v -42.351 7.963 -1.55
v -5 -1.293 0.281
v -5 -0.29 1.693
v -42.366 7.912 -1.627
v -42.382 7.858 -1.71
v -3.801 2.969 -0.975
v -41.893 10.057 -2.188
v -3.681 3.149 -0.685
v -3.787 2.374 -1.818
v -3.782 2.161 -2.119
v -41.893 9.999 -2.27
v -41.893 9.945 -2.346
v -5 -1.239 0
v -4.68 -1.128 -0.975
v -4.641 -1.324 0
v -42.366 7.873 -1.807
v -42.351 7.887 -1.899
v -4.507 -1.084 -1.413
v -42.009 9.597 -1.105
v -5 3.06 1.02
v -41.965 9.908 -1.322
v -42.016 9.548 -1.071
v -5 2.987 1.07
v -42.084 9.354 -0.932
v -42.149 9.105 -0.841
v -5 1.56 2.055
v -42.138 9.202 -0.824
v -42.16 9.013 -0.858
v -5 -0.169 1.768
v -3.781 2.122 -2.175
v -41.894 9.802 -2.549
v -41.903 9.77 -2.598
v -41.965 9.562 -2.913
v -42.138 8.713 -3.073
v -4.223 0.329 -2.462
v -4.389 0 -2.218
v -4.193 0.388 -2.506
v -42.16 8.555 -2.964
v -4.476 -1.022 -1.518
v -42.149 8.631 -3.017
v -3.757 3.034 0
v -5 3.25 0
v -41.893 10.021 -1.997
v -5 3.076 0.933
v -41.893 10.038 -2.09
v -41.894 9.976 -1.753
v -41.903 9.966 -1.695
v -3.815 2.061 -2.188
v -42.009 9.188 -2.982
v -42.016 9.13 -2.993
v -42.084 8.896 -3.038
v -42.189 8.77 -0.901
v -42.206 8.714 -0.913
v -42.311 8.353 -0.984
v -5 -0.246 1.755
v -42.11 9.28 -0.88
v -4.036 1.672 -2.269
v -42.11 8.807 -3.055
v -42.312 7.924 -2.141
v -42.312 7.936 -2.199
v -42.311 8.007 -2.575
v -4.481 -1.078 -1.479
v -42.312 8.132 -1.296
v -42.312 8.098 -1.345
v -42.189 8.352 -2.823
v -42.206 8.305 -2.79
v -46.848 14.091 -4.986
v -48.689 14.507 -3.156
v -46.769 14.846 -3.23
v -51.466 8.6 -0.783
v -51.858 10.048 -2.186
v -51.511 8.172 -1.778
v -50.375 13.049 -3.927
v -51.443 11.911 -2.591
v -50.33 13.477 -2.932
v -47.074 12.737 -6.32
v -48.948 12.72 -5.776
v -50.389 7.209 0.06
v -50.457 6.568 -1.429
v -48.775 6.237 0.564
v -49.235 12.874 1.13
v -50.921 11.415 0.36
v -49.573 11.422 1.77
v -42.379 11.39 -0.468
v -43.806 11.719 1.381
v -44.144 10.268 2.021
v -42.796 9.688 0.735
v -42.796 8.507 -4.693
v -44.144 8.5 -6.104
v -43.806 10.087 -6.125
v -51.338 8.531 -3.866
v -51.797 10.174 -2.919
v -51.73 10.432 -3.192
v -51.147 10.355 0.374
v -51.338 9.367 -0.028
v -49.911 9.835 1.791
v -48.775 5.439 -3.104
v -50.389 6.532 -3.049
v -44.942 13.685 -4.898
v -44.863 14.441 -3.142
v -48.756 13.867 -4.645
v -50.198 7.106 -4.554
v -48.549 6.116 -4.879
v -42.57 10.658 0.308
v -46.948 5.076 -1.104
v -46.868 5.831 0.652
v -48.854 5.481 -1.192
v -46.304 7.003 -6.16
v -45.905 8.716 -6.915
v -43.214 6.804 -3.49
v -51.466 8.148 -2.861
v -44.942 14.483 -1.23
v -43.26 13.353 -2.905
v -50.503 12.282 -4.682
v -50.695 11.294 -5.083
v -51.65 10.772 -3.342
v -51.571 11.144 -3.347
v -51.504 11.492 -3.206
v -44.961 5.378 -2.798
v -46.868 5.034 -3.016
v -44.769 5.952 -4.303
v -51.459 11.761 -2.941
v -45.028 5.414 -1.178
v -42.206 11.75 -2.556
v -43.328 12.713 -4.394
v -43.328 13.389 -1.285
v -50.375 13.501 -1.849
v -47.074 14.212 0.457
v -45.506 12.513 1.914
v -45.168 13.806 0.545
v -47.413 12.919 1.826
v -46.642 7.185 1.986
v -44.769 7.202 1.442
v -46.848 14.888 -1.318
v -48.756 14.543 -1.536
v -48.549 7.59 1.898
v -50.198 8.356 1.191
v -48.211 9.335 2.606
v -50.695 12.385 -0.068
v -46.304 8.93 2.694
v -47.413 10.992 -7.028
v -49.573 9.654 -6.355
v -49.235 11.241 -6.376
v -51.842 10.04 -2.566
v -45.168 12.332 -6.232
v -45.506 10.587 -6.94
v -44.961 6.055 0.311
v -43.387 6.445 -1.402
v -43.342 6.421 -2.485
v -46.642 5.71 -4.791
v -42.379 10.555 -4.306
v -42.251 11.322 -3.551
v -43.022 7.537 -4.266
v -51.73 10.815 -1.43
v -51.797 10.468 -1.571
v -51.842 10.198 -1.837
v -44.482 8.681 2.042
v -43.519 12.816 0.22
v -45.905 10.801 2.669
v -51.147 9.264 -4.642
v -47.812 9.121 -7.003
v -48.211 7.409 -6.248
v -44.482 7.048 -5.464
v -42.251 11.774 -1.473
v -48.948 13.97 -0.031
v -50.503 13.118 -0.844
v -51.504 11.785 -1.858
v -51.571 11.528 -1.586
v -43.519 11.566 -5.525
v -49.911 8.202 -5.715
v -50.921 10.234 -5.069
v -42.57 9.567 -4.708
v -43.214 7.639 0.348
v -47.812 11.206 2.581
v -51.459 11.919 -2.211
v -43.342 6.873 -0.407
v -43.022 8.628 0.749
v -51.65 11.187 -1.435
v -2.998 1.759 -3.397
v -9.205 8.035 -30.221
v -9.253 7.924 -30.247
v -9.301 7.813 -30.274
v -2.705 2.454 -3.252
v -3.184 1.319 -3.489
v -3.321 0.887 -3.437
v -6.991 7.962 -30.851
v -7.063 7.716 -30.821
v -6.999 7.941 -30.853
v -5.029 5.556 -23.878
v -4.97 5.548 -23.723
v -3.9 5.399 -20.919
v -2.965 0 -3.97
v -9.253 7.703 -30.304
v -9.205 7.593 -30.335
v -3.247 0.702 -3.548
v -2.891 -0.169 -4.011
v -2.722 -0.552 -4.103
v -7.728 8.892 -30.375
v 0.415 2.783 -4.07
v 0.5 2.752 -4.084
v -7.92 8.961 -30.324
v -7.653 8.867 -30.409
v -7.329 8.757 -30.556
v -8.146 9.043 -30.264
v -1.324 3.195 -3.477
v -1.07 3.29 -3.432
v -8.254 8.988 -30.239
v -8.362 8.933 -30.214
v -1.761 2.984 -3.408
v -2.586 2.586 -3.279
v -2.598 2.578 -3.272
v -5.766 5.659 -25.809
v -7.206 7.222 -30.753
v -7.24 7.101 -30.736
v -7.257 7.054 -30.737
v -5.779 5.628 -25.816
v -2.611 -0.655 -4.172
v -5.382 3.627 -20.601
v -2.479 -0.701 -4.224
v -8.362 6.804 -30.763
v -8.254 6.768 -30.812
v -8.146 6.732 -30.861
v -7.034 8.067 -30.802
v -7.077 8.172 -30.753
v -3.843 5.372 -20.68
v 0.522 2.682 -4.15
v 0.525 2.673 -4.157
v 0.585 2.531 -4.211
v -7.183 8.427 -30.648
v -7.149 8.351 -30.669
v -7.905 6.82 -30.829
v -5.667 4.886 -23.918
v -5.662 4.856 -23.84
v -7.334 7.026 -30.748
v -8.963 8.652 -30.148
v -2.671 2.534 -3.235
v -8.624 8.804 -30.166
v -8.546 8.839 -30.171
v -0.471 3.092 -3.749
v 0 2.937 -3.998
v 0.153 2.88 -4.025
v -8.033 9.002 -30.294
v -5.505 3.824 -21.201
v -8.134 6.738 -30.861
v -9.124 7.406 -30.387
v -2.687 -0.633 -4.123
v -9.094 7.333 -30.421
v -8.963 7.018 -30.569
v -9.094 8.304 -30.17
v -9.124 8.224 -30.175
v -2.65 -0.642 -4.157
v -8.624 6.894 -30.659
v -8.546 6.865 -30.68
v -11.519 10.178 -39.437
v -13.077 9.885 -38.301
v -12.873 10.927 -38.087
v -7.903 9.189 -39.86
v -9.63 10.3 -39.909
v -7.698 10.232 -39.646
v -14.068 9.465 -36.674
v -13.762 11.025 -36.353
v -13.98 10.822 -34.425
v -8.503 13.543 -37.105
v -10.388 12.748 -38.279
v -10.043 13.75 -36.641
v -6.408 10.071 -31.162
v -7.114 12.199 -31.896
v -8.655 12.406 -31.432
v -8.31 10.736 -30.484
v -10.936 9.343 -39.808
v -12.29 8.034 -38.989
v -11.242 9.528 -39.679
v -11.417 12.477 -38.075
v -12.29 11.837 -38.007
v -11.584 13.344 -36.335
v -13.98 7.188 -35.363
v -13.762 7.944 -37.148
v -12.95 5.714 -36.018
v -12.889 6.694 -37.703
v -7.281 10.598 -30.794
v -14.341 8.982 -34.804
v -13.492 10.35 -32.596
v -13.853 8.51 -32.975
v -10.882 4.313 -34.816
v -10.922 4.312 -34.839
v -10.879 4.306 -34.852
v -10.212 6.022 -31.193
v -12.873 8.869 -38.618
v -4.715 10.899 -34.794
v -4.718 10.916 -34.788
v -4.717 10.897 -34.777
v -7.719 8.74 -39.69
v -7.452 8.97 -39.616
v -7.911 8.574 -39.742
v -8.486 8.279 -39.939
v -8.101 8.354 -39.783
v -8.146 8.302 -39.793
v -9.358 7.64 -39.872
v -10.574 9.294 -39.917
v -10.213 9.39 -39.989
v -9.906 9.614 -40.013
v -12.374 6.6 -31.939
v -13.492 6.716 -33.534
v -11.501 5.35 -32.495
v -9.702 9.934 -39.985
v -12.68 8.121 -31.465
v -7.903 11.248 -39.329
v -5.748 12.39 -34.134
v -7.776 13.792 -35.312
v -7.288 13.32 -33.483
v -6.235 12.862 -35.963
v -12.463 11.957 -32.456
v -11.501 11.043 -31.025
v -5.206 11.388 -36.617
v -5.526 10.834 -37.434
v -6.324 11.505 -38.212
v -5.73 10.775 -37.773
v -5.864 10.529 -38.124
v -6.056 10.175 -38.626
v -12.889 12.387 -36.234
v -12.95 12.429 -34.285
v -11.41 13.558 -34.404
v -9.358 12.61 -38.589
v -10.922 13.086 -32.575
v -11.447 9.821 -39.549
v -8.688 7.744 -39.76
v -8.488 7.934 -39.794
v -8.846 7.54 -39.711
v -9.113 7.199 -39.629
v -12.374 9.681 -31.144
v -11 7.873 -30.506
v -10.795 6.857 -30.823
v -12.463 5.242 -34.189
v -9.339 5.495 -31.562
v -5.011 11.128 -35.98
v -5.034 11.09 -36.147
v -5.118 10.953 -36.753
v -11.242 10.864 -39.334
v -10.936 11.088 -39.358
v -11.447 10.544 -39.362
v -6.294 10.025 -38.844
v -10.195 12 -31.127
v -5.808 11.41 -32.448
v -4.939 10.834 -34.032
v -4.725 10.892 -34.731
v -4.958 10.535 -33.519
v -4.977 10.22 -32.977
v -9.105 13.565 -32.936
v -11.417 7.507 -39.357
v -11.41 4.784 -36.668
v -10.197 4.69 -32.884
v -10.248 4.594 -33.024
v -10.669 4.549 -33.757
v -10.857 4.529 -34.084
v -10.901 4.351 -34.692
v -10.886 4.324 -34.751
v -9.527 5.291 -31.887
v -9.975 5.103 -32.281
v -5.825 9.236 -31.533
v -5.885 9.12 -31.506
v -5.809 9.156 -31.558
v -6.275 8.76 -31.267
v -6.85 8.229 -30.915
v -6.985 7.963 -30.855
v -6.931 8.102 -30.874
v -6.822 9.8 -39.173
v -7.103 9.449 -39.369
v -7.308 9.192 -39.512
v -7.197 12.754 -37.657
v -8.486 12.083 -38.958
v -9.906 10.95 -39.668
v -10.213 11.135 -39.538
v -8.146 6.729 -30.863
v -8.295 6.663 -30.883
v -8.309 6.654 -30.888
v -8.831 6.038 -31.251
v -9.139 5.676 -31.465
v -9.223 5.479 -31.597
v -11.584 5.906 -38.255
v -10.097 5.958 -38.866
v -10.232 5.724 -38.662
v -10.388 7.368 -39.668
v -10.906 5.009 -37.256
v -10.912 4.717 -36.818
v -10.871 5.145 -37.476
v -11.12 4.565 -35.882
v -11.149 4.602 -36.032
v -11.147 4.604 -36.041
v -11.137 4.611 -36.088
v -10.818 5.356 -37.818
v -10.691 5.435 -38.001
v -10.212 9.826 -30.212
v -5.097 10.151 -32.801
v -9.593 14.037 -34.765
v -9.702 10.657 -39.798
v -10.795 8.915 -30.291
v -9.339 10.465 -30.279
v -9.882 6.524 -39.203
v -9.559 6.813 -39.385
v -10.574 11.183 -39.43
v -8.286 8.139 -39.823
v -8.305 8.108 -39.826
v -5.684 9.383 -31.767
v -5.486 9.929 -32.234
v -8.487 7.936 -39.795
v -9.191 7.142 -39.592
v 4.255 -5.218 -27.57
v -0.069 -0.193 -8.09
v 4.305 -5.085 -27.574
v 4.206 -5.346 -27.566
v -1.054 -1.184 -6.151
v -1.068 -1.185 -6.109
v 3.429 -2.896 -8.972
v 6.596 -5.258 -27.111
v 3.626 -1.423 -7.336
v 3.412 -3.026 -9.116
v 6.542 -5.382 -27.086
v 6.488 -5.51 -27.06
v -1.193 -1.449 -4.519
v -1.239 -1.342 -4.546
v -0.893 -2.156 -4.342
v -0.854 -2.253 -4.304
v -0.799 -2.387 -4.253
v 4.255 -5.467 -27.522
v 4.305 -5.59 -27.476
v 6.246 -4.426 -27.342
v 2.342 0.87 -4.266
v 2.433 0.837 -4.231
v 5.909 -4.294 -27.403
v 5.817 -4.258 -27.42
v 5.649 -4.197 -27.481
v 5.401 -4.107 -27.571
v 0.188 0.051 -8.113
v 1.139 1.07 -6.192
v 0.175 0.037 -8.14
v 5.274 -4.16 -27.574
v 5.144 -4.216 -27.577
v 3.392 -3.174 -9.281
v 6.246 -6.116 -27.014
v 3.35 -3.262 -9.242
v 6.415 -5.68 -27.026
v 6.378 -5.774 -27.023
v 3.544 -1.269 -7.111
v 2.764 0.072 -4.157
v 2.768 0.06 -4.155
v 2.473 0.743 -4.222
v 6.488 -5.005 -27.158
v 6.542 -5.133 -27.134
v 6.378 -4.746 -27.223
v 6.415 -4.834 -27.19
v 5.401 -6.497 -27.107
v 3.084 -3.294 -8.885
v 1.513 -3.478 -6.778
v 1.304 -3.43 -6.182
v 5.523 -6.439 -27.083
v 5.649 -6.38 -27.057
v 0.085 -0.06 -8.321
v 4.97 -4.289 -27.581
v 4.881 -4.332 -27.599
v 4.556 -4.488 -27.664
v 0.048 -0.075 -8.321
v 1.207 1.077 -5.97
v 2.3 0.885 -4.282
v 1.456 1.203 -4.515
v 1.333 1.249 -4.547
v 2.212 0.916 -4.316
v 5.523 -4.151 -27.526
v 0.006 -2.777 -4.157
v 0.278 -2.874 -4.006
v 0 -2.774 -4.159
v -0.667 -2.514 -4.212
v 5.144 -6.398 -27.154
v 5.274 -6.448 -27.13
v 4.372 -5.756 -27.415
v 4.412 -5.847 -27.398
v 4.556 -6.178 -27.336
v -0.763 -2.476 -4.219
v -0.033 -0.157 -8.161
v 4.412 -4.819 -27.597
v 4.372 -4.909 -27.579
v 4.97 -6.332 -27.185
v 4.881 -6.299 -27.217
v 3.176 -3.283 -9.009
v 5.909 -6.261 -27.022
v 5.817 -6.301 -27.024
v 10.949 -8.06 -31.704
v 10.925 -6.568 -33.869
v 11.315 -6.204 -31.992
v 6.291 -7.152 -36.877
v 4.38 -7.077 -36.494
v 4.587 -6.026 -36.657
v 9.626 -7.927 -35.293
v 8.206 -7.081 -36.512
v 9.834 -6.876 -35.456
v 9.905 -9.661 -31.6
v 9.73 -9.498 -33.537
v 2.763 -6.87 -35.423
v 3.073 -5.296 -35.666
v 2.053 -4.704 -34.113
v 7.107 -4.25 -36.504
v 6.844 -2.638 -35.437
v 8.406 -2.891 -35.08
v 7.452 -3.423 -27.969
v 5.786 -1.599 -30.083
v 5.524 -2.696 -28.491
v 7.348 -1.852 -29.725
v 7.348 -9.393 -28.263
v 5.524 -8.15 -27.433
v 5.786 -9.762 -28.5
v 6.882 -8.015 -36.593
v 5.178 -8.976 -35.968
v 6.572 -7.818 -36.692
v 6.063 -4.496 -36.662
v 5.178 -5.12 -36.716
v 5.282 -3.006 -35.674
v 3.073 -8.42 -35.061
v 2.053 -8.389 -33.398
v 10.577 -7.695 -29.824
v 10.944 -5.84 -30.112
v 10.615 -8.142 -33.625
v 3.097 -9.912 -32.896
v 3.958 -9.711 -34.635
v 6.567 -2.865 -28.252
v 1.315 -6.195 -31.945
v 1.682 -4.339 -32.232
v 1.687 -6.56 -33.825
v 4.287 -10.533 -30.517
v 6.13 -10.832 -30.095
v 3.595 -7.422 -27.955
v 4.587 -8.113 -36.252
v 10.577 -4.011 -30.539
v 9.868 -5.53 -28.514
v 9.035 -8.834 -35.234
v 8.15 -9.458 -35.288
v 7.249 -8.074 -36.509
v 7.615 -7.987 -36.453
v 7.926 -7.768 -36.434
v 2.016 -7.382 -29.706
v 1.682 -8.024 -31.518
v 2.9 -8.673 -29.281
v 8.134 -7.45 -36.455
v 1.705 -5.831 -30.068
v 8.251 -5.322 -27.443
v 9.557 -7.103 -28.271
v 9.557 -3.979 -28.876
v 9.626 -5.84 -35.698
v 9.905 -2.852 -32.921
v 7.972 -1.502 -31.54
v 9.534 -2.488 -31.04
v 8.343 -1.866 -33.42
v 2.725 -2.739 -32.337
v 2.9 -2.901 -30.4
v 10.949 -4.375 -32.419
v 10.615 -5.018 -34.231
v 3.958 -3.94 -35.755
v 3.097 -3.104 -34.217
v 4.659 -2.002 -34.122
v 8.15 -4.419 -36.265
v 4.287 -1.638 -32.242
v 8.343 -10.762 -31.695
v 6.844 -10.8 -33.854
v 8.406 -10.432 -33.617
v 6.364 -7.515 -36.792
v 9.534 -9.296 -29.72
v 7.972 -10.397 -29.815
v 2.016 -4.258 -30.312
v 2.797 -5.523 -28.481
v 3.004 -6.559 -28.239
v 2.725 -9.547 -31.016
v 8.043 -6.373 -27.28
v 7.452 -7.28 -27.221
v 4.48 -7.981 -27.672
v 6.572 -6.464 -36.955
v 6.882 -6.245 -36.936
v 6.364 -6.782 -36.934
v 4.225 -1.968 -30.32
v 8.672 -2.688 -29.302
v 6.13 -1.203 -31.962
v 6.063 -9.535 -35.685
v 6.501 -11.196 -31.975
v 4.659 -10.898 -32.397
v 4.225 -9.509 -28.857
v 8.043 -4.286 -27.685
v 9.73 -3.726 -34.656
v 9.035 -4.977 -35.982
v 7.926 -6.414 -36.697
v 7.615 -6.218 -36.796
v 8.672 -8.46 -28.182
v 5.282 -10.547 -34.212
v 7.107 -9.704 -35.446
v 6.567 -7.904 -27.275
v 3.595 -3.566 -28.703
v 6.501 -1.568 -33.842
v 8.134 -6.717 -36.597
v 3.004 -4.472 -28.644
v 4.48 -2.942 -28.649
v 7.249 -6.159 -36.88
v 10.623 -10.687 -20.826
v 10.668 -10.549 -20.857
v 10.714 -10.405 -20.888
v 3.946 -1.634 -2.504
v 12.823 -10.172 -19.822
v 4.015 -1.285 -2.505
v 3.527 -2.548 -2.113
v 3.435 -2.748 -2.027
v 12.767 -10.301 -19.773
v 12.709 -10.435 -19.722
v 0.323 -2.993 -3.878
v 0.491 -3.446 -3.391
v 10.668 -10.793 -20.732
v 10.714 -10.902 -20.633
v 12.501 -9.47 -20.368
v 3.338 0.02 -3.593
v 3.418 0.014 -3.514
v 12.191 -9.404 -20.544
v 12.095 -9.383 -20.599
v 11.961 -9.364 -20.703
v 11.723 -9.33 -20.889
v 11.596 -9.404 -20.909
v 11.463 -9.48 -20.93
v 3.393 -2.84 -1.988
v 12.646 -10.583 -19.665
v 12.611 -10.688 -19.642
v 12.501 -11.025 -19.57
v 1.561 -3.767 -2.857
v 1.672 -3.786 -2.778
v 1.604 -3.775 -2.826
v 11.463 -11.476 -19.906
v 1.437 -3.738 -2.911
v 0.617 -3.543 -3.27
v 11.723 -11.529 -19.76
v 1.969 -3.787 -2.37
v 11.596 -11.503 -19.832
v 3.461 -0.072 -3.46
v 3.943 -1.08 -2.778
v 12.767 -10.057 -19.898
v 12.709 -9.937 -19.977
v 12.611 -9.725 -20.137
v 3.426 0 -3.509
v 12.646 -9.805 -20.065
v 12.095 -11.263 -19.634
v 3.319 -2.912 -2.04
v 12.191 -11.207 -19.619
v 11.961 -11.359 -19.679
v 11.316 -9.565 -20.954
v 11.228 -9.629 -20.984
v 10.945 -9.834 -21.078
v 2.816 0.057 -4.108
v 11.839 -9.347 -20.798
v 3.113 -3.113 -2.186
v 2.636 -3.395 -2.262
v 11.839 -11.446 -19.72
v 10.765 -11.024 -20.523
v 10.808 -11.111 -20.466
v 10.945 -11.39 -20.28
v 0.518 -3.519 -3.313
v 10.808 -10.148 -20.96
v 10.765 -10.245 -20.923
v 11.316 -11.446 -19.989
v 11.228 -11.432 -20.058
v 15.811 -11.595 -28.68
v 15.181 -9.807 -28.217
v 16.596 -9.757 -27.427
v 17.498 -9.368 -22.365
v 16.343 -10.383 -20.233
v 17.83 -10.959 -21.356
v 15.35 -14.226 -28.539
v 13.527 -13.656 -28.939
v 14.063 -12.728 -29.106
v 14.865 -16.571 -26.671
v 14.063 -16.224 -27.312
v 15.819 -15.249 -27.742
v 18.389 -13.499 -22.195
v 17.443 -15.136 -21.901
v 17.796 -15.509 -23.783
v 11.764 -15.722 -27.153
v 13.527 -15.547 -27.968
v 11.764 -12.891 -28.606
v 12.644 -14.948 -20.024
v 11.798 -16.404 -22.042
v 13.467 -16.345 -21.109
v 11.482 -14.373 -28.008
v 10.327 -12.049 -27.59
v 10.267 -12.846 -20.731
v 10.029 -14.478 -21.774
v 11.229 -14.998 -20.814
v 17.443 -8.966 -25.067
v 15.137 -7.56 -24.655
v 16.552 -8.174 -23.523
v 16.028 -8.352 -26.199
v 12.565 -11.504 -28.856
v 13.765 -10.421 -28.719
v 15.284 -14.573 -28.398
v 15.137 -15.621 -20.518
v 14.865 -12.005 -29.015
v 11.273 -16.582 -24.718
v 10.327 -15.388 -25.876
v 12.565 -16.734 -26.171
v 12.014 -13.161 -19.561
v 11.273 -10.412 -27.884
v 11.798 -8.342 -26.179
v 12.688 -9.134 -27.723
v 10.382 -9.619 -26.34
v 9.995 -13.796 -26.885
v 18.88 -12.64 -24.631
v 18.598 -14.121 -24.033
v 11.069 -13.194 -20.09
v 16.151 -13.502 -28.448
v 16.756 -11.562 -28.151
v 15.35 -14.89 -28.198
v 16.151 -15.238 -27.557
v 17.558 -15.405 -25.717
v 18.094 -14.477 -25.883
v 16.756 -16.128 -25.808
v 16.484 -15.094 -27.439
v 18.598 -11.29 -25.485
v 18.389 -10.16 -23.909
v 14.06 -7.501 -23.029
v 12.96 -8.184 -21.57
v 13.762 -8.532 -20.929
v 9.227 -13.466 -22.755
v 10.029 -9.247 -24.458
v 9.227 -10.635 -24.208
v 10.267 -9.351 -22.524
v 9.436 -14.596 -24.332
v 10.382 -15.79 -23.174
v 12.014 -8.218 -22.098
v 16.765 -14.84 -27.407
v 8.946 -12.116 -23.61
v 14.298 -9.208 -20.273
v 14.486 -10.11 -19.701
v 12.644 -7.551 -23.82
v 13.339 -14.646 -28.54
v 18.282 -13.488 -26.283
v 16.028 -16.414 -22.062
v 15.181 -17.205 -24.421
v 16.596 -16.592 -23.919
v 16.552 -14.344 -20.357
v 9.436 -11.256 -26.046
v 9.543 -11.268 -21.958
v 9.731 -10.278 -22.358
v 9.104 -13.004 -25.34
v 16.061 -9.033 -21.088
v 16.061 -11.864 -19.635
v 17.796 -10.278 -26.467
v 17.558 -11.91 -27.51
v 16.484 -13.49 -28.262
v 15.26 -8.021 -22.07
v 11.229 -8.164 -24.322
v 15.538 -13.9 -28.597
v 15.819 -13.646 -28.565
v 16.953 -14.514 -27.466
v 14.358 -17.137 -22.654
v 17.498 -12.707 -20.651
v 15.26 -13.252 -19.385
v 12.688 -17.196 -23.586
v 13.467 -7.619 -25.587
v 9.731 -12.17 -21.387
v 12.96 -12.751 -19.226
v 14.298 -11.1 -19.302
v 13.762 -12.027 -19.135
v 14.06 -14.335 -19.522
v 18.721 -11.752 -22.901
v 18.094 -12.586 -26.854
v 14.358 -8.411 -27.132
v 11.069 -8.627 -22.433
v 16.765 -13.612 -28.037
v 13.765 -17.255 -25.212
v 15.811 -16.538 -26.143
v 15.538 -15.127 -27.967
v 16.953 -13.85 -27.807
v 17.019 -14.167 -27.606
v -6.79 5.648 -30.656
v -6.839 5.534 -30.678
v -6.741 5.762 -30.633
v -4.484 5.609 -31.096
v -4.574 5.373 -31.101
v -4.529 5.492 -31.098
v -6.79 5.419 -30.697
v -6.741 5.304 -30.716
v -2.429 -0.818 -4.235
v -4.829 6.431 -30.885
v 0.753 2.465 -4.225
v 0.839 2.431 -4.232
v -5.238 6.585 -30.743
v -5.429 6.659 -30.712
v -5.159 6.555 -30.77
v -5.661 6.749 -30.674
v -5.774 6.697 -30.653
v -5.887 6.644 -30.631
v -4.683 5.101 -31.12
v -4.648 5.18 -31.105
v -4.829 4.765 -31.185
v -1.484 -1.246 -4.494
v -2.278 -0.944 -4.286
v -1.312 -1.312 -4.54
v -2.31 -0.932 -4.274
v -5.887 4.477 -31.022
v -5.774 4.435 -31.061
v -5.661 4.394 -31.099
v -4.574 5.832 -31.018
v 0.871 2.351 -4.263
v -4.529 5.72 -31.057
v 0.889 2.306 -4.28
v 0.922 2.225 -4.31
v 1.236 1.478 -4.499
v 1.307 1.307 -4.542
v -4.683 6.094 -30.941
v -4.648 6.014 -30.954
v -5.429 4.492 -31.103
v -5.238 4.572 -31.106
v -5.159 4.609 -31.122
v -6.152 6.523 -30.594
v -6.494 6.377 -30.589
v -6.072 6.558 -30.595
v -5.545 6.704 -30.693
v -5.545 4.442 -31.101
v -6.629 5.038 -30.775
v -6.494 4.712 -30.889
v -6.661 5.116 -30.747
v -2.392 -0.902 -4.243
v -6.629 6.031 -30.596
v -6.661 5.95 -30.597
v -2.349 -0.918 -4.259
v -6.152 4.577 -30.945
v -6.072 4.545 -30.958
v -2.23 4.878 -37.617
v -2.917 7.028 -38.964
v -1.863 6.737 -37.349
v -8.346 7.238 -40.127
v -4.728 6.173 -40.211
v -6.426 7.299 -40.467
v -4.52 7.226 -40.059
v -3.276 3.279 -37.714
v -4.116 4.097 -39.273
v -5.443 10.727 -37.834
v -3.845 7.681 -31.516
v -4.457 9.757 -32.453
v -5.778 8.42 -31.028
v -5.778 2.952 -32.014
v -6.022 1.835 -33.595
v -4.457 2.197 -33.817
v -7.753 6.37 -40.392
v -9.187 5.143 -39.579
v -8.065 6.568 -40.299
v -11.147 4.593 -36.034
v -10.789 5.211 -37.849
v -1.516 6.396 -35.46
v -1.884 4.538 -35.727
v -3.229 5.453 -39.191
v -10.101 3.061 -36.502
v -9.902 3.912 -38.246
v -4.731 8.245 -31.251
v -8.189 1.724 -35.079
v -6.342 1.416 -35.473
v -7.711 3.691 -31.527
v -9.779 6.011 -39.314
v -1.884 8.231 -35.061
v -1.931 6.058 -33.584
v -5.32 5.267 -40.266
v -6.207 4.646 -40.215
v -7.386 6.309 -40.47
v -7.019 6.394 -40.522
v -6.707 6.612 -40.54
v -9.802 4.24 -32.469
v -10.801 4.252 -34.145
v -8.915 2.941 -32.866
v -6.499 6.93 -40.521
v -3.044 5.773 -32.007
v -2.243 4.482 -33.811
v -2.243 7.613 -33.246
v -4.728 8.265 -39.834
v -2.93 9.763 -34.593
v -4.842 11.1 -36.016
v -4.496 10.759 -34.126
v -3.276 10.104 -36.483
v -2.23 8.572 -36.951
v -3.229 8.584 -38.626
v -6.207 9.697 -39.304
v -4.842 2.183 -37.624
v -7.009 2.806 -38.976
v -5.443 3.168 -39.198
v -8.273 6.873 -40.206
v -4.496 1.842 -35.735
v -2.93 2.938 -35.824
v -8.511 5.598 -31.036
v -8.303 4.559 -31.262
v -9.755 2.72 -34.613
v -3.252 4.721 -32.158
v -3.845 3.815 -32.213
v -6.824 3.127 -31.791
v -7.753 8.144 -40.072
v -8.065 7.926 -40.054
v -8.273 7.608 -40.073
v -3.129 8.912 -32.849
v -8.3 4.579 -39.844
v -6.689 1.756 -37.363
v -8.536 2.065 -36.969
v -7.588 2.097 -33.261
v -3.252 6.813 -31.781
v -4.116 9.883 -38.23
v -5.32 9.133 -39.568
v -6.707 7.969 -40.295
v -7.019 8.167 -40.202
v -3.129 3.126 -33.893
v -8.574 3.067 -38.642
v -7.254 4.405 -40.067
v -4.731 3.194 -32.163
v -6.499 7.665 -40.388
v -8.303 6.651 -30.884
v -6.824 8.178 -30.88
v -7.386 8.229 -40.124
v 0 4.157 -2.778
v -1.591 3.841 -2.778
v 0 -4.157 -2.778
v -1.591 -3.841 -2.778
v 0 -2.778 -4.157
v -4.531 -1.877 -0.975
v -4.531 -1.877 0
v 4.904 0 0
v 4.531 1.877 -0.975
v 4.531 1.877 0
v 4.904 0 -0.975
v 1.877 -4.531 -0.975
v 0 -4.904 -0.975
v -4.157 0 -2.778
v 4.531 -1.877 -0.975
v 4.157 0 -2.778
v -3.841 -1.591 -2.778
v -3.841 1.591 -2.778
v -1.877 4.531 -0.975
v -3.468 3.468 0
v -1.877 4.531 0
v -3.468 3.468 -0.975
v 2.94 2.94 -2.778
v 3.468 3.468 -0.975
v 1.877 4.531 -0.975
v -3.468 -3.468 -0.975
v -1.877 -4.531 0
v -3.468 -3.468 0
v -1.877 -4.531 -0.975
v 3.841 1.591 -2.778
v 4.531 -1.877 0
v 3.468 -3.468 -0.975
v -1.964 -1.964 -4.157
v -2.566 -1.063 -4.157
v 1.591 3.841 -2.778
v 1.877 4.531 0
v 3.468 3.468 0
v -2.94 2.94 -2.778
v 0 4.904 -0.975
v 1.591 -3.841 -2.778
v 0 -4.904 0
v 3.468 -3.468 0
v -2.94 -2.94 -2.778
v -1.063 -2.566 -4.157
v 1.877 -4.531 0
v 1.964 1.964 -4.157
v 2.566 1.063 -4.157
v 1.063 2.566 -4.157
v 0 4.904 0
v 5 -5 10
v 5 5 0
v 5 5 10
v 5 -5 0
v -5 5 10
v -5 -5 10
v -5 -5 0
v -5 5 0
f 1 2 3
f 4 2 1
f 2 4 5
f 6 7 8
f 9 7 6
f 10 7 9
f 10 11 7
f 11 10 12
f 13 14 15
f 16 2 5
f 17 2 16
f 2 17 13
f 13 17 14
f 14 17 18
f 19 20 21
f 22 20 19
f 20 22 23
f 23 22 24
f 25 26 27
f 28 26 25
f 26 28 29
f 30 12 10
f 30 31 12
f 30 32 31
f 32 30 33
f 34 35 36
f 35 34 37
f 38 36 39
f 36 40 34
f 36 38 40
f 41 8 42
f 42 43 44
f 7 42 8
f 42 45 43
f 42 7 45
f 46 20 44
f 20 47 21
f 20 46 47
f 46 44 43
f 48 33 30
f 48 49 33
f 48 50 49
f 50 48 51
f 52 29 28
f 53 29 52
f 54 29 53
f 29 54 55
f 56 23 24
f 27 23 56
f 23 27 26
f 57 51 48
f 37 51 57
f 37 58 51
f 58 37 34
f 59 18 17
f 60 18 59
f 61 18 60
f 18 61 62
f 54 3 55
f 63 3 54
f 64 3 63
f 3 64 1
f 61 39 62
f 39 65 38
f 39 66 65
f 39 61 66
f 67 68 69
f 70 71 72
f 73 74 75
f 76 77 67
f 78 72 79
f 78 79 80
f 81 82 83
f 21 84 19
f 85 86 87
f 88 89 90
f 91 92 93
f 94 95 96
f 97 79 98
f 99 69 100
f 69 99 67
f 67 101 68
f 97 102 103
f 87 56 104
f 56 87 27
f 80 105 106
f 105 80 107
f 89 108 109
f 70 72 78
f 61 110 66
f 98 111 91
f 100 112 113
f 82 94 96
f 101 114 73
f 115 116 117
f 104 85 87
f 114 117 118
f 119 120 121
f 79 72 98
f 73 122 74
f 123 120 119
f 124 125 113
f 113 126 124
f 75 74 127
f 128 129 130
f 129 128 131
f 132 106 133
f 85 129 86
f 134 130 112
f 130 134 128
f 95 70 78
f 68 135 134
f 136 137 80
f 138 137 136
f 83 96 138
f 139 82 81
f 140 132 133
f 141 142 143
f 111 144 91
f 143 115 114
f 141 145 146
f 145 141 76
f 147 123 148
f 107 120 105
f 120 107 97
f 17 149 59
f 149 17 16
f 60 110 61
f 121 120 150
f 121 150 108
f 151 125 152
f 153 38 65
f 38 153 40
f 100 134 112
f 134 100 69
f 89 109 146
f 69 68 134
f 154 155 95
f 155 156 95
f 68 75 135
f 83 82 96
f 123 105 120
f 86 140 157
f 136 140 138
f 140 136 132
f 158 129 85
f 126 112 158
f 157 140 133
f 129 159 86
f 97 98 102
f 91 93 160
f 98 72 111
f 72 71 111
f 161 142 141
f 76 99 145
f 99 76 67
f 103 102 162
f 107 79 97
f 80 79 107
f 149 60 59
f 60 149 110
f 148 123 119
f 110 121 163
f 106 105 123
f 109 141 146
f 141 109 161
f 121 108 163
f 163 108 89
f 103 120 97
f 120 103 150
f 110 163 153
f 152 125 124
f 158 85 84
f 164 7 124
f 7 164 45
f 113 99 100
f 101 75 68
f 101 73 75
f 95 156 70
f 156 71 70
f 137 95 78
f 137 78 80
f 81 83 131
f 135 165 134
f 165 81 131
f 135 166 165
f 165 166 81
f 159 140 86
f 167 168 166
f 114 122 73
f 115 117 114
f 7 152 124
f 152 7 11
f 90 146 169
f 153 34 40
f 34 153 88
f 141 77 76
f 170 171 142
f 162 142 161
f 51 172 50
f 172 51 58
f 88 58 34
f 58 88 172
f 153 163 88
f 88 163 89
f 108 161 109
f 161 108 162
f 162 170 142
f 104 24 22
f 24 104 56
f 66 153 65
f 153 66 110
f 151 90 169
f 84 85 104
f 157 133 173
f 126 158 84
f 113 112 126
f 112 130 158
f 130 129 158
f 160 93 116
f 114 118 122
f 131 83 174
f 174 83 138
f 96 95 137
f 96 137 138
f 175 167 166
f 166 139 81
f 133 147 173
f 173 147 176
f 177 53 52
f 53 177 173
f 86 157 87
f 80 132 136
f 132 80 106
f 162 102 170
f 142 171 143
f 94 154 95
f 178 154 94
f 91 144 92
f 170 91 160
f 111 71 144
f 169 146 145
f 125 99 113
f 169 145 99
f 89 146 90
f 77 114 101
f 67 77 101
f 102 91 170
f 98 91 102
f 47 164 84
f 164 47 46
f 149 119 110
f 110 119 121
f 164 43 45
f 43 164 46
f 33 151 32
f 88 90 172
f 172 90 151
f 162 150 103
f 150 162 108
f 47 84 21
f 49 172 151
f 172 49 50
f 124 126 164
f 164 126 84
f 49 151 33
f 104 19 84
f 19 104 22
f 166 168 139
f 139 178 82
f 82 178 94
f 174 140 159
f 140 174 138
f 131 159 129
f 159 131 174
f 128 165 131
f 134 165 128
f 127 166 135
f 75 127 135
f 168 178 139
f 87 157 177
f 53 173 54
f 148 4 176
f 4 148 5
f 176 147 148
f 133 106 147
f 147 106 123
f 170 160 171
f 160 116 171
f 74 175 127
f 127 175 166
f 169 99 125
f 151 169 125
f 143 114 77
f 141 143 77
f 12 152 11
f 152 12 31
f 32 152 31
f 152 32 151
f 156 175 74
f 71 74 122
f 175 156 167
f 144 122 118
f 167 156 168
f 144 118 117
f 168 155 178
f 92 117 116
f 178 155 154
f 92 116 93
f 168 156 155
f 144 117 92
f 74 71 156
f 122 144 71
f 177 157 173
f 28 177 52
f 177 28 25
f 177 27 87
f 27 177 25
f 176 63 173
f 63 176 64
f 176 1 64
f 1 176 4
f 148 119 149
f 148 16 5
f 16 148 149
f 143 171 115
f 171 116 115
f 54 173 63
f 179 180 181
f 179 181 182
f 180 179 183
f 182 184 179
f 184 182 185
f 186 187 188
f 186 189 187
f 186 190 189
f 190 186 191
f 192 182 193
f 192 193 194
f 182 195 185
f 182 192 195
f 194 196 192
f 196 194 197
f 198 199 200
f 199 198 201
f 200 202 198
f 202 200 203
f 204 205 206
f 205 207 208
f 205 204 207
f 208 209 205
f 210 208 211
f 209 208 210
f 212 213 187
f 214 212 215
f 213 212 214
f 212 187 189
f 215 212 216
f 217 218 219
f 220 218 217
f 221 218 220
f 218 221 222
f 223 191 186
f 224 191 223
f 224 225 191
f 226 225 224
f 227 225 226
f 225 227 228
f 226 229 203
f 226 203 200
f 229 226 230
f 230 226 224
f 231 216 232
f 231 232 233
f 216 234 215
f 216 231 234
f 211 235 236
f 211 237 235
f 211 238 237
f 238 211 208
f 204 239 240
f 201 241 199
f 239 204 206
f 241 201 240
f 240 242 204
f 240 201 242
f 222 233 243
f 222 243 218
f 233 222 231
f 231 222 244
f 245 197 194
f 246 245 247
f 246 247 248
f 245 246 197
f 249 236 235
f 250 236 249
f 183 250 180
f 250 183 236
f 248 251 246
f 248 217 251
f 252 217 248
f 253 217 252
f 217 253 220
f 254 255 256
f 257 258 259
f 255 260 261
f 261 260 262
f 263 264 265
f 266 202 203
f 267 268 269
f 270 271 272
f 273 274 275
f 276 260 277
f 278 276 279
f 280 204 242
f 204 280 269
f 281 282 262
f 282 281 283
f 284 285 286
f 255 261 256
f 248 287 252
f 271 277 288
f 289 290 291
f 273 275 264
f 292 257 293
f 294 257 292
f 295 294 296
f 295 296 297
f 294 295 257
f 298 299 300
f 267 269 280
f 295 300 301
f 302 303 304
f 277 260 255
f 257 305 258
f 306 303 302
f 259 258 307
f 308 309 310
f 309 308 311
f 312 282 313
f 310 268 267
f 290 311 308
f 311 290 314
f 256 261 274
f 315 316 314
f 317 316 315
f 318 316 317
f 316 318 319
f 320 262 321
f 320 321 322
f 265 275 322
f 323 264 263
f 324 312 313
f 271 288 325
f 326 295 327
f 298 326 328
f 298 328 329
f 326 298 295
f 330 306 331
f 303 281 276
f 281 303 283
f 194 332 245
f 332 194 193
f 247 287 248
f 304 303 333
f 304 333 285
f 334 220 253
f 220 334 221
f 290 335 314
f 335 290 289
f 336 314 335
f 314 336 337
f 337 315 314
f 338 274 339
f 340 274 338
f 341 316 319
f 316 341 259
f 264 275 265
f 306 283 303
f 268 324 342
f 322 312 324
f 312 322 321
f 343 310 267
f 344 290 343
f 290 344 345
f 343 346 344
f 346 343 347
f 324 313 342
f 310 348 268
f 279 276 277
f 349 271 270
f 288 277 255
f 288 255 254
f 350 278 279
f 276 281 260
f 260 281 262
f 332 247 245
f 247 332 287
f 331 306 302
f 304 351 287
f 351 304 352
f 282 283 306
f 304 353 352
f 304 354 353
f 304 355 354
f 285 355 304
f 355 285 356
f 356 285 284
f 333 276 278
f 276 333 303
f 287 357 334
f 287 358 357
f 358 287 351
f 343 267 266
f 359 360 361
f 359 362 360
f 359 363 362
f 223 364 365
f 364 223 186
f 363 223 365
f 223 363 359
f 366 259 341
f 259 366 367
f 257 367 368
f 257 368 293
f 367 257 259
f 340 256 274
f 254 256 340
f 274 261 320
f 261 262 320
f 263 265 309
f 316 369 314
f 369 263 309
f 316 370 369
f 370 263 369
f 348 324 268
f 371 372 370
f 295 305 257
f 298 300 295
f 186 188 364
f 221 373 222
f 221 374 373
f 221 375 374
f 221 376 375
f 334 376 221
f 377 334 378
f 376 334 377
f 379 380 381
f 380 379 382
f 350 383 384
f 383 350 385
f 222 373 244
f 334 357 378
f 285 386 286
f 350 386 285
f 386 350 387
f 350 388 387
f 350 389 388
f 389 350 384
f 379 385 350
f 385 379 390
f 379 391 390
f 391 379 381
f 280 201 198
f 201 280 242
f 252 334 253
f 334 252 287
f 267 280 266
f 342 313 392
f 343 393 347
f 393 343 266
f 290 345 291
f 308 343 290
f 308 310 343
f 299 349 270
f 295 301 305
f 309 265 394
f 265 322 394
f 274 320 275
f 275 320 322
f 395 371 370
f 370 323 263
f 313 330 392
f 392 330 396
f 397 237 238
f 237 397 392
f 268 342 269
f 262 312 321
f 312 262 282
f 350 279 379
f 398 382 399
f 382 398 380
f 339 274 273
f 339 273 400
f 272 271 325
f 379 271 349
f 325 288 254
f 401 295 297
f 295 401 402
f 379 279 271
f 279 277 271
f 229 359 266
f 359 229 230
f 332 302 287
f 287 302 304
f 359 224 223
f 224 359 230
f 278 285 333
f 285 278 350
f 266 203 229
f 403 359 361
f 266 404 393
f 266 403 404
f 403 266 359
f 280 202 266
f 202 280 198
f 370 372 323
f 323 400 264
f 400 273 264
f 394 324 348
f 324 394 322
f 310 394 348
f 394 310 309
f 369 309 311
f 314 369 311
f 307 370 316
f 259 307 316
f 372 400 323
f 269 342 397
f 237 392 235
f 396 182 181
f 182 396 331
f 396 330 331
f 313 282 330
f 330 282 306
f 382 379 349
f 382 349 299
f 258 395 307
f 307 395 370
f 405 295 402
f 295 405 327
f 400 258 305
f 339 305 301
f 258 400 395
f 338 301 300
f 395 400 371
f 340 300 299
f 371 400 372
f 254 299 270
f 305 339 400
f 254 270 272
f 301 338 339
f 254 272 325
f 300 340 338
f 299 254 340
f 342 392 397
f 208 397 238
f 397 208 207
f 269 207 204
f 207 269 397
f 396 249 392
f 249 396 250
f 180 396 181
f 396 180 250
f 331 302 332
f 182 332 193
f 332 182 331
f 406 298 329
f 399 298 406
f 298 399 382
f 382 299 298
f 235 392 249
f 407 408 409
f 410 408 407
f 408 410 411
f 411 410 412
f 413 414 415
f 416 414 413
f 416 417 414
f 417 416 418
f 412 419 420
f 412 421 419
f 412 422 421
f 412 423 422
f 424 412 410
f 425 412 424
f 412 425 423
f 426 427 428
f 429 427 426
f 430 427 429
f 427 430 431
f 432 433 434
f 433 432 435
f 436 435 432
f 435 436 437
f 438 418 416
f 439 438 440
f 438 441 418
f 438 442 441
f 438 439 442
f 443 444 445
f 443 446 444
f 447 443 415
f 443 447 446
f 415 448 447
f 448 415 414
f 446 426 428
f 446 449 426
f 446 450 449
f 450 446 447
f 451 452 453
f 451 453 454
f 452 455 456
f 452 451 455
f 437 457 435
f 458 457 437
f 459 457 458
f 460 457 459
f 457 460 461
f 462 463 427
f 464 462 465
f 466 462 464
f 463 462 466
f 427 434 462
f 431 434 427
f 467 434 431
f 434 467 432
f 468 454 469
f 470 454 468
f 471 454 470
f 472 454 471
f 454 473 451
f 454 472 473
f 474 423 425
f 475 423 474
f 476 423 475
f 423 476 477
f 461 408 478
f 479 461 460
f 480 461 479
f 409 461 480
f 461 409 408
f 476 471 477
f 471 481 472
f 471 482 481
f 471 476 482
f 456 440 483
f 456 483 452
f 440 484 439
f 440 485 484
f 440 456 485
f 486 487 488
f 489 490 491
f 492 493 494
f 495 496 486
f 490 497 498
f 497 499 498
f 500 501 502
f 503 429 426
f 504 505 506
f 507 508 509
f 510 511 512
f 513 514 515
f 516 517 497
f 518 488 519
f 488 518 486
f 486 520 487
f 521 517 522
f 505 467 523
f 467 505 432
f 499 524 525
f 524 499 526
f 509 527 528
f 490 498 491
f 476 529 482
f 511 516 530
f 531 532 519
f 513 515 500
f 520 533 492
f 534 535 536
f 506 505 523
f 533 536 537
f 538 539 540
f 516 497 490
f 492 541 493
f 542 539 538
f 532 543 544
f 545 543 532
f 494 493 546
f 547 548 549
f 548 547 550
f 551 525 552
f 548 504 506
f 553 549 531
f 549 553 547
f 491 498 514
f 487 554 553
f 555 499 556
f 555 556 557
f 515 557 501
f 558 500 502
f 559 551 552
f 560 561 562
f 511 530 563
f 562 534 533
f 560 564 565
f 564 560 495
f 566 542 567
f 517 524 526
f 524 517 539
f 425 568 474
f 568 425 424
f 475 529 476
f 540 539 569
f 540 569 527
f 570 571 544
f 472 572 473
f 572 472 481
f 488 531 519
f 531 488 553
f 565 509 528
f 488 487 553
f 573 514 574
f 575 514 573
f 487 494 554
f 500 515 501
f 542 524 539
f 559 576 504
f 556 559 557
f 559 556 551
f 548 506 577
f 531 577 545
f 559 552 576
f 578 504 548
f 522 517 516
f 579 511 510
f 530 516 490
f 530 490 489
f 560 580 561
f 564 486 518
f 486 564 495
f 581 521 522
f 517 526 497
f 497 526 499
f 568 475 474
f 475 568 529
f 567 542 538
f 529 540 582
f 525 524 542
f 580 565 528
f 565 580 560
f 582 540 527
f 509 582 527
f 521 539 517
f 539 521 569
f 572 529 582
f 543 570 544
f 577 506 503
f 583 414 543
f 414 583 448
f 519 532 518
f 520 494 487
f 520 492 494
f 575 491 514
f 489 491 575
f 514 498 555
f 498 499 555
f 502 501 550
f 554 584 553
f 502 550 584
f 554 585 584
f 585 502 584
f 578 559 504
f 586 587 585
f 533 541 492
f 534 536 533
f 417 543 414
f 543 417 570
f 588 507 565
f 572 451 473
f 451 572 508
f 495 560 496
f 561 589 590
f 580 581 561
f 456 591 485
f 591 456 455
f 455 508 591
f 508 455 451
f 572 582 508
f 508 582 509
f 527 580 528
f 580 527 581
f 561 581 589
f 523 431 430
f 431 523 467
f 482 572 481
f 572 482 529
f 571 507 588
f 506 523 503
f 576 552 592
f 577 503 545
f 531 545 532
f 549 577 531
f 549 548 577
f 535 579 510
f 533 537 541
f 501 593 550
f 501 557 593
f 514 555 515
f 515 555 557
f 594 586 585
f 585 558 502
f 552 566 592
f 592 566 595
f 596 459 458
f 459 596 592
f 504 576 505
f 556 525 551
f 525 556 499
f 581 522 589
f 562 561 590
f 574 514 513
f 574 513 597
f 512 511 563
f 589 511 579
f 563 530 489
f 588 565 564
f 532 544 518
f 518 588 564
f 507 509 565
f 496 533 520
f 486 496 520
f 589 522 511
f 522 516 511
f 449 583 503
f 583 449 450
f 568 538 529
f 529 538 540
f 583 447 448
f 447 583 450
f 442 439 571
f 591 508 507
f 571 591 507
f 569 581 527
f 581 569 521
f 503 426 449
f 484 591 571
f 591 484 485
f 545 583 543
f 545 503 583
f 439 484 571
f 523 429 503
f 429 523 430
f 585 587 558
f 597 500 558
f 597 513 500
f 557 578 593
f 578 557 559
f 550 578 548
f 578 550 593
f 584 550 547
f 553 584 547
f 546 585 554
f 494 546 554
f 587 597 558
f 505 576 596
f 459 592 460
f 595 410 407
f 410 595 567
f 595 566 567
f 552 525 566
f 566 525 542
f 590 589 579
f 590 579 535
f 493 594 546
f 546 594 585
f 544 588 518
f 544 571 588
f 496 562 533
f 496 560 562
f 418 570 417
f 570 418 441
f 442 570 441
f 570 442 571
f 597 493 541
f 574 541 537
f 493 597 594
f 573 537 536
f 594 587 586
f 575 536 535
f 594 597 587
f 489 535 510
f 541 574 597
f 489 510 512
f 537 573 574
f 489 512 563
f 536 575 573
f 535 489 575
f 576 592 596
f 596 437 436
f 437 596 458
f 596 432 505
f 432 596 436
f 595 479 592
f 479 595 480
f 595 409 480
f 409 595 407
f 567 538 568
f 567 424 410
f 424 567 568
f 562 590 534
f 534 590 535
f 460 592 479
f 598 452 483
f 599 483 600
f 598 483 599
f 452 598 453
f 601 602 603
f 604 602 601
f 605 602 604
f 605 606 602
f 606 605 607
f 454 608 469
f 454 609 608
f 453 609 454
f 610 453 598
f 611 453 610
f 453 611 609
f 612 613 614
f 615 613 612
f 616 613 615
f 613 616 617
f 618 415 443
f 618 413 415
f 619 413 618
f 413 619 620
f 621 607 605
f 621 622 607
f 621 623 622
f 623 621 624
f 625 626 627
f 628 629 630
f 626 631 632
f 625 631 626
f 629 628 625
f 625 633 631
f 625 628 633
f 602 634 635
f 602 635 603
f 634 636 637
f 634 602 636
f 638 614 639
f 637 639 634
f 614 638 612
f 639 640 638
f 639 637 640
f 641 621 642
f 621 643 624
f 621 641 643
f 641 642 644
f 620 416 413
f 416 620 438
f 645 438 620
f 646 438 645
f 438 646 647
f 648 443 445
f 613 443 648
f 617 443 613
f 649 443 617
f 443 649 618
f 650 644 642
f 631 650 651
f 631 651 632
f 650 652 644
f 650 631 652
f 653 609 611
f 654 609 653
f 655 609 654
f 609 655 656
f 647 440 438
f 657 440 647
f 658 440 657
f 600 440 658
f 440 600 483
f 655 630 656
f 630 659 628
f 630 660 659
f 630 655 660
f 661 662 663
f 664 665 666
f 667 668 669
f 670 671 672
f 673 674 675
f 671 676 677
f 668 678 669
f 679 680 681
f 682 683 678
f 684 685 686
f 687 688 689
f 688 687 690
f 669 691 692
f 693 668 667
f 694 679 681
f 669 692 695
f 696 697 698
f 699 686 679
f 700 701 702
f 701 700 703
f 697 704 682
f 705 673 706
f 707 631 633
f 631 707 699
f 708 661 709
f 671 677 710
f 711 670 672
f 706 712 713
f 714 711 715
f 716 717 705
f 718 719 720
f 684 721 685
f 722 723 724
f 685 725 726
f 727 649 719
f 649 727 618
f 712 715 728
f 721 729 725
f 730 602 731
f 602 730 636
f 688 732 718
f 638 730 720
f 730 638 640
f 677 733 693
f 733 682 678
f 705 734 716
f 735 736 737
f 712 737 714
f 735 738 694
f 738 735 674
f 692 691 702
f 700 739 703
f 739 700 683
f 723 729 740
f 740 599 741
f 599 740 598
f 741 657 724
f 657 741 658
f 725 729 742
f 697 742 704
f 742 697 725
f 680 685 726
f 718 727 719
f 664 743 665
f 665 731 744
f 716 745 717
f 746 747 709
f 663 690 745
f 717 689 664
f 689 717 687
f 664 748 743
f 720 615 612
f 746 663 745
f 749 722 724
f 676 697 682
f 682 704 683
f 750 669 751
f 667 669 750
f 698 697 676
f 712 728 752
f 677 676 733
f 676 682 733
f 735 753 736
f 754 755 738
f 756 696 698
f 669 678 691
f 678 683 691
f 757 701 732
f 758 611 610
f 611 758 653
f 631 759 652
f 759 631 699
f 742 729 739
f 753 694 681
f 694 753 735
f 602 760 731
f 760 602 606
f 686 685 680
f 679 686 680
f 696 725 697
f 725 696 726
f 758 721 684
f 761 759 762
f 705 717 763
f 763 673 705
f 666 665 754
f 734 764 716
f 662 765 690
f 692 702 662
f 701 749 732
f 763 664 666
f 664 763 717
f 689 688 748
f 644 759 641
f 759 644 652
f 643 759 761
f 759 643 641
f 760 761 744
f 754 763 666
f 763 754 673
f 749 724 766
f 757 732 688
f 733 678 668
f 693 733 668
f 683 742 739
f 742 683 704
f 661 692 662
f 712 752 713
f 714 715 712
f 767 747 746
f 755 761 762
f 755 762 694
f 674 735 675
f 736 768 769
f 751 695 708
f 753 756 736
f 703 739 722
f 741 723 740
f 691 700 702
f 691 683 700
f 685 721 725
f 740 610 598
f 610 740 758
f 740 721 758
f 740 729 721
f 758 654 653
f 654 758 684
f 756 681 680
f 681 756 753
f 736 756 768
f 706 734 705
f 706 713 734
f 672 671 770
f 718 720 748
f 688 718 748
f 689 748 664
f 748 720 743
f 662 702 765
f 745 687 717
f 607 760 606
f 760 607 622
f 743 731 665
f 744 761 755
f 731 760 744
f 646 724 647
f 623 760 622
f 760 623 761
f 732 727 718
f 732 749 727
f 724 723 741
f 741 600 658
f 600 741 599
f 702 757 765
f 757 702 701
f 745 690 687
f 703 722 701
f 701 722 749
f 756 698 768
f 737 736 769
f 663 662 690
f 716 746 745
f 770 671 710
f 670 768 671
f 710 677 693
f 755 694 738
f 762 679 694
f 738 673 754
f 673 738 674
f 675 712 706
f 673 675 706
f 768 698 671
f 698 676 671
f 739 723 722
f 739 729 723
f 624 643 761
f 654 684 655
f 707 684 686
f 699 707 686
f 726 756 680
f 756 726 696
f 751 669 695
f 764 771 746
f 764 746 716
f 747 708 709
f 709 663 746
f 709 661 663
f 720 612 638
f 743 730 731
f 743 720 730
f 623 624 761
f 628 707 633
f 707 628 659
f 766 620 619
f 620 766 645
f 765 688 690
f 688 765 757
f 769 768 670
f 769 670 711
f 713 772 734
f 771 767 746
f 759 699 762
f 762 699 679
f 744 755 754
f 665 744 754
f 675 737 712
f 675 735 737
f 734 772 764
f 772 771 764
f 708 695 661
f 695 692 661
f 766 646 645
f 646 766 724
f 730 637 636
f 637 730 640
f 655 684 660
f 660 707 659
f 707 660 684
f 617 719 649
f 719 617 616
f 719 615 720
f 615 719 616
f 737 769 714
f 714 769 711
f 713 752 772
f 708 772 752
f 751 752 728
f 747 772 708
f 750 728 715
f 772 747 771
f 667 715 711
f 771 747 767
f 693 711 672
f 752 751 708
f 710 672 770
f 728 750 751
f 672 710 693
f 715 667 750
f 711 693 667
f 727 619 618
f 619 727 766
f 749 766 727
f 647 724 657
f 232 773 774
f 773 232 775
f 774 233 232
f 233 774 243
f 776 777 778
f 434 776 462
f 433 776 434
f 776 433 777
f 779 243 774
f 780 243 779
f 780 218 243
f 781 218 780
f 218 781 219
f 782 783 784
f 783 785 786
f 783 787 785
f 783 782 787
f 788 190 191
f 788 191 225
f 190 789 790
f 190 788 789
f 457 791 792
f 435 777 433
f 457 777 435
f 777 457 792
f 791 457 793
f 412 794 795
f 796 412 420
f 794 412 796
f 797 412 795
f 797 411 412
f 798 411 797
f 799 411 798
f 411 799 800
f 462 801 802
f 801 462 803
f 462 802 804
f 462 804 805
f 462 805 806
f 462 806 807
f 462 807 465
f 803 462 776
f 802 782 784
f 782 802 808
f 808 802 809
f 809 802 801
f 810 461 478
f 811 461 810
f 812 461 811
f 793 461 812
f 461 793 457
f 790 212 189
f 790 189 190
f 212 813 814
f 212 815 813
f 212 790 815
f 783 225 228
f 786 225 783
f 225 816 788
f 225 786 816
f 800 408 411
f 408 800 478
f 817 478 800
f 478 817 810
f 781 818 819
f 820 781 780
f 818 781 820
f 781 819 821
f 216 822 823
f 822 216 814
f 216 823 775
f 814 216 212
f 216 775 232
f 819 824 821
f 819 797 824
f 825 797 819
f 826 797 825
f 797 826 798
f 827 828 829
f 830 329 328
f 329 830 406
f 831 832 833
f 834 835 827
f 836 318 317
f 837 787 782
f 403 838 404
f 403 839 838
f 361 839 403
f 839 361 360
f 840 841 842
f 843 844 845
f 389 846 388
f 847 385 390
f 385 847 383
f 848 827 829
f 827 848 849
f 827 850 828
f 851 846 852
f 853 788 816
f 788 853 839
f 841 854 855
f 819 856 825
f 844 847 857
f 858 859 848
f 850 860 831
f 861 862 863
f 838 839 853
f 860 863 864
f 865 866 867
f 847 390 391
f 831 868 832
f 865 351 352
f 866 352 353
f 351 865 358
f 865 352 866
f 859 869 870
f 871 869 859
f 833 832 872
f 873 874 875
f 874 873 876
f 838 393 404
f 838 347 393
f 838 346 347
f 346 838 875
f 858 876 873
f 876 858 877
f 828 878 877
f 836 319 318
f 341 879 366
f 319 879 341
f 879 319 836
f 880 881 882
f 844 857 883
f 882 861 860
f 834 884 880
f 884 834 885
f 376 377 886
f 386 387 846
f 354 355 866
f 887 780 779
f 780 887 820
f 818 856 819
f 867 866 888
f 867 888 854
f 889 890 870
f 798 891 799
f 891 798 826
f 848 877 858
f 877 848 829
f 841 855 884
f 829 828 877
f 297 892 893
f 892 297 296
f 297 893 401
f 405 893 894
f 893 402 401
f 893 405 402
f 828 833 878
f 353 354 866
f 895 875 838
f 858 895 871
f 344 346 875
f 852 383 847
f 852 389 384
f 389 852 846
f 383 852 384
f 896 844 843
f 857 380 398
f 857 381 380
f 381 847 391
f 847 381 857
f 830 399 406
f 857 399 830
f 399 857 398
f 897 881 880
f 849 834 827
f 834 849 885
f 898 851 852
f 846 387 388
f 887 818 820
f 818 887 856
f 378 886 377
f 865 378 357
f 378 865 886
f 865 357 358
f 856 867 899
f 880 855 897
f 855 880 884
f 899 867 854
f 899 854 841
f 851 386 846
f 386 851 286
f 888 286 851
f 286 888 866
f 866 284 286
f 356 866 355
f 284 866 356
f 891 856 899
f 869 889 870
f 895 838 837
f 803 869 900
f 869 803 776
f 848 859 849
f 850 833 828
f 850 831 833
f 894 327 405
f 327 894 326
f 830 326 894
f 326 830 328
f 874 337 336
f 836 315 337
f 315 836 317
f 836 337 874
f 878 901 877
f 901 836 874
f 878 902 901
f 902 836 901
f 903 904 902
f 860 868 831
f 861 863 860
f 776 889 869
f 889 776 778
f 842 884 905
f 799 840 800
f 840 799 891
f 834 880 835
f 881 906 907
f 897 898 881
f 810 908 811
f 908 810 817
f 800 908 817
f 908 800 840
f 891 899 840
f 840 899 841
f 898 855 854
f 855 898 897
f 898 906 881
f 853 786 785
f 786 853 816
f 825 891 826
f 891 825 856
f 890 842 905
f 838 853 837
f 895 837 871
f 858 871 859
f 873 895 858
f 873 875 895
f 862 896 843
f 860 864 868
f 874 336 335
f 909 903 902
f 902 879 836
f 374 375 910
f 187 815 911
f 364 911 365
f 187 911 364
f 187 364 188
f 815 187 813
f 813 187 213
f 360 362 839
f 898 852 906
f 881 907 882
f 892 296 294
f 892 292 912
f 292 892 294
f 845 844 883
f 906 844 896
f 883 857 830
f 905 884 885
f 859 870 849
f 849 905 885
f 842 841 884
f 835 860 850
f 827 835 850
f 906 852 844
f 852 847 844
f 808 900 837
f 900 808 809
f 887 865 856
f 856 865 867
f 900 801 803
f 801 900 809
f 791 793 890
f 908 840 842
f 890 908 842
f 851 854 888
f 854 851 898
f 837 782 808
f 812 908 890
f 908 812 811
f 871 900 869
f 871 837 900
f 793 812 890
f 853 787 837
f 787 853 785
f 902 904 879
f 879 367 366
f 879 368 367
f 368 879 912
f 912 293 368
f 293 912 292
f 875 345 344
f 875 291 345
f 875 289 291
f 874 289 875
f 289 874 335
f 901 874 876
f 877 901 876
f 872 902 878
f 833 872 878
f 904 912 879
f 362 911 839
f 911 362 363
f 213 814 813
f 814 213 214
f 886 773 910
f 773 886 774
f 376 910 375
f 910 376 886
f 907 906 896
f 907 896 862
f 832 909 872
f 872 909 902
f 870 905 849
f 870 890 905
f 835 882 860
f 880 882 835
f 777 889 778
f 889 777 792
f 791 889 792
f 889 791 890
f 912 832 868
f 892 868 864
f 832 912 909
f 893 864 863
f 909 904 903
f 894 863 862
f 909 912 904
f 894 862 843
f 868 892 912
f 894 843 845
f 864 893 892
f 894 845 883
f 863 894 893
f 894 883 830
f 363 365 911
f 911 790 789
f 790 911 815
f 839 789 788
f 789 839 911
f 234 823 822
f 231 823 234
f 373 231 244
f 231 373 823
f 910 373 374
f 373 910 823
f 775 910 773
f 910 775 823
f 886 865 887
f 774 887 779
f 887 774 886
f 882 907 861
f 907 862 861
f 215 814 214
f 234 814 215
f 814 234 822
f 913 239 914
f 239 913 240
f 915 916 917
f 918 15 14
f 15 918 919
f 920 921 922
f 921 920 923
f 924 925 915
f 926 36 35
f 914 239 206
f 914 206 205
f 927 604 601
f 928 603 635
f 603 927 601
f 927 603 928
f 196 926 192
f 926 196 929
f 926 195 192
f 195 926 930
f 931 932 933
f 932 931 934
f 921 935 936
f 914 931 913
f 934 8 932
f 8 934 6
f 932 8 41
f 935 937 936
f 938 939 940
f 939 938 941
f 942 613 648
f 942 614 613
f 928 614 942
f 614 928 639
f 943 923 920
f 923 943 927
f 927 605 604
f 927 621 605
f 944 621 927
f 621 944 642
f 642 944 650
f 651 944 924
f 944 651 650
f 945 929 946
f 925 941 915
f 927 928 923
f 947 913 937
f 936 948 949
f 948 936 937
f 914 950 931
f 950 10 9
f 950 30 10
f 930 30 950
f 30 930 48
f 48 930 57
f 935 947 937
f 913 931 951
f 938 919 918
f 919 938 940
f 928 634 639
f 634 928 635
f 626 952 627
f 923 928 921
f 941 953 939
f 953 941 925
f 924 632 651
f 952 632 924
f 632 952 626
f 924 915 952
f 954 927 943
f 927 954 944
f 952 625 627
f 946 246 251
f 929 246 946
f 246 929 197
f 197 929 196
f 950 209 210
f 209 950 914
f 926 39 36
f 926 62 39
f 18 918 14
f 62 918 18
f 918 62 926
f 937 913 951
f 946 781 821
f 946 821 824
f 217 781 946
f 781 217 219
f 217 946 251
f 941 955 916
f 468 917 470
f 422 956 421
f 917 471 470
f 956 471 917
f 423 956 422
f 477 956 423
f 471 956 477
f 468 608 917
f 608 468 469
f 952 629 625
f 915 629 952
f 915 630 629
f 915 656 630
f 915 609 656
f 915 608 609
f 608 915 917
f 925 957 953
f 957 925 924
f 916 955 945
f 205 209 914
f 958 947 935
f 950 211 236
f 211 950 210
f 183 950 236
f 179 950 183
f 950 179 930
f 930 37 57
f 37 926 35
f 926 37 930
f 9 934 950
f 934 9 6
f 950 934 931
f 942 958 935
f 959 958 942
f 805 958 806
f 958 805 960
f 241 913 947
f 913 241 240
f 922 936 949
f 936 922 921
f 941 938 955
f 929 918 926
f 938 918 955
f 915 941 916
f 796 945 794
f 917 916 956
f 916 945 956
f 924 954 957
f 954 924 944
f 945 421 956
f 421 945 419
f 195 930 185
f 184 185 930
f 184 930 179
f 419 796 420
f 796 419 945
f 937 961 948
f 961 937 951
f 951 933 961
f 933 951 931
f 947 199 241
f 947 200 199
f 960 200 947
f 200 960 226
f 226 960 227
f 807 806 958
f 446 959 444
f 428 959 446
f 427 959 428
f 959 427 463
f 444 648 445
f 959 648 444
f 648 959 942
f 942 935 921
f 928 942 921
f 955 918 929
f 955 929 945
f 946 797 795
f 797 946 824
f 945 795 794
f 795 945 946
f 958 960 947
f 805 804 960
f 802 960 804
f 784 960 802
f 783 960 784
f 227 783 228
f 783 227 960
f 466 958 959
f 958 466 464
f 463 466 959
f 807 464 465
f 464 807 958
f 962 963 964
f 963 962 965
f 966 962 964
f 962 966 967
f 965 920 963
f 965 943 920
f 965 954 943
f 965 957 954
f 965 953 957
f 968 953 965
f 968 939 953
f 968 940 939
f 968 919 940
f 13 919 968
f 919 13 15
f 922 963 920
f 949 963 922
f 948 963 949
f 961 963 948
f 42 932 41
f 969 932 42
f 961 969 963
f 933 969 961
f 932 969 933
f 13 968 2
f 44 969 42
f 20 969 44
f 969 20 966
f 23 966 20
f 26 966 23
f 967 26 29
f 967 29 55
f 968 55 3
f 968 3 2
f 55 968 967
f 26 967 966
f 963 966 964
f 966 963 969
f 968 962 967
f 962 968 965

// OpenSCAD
//	Custom OptiTrack Marker Generator
// (c) James Walsh - james.walsh@setoreaustralia.com
// Original concept and prototype by Bruce Thomas (http://www.unisanet.unisa.edu.au/Staff/Homepage.asp?Name=Bruce.Thomas)

//CUSTOMIZER VARIABLES

//	Stand Width (X) (mm)
x_measurement = 10;

//	Stand Width (Y) (mm)
y_measurement = 10;

//	Stand Height (mm)
z_measurement = 10;

//	Marker Diameter (mm)
diameter = 10;	//	[5:40]

//	Number of Markers
marker_count = 5;	//	[1:5]

//	Max Marker Distance from Center
max_length = 7;	//	[5:15]

//Marker ID (Random Seed to Generate Marker)
seed = 150; // [0 : 300]

//CUSTOMIZER VARIABLES END

//core stand
translate([0,0,z_measurement/2]) cube([x_measurement, y_measurement, z_measurement], center=true);

//random marker offsets
rotX = rands(0, 180, marker_count, seed);
rotY = rands(0, 180, marker_count, seed);
rotZ = rands(0, 360, marker_count, seed);
lengthR = rands(diameter * 2, max(diameter * 5, max_length), marker_count, seed);

//draw the markers
for (i = [0 : marker_count])
{
	markerOnAStick(rotX[i] - 90, rotY[i] + 90, rotZ[i], lengthR[i], diameter);
}

module markerOnAStick(rotX, rotY, rotZ, length, diameter)
{
	rotate(rotX, [1, 0, 0])
	{
		rotate(rotY, [0, 1, 0])
		{
			rotate(0 , [0, 0, 1])
			{
				cylinder(length, diameter / 4);
				translate([0,0,length]) 
				{
					sphere(diameter / 2);
				}
			}
		}
	}
}
